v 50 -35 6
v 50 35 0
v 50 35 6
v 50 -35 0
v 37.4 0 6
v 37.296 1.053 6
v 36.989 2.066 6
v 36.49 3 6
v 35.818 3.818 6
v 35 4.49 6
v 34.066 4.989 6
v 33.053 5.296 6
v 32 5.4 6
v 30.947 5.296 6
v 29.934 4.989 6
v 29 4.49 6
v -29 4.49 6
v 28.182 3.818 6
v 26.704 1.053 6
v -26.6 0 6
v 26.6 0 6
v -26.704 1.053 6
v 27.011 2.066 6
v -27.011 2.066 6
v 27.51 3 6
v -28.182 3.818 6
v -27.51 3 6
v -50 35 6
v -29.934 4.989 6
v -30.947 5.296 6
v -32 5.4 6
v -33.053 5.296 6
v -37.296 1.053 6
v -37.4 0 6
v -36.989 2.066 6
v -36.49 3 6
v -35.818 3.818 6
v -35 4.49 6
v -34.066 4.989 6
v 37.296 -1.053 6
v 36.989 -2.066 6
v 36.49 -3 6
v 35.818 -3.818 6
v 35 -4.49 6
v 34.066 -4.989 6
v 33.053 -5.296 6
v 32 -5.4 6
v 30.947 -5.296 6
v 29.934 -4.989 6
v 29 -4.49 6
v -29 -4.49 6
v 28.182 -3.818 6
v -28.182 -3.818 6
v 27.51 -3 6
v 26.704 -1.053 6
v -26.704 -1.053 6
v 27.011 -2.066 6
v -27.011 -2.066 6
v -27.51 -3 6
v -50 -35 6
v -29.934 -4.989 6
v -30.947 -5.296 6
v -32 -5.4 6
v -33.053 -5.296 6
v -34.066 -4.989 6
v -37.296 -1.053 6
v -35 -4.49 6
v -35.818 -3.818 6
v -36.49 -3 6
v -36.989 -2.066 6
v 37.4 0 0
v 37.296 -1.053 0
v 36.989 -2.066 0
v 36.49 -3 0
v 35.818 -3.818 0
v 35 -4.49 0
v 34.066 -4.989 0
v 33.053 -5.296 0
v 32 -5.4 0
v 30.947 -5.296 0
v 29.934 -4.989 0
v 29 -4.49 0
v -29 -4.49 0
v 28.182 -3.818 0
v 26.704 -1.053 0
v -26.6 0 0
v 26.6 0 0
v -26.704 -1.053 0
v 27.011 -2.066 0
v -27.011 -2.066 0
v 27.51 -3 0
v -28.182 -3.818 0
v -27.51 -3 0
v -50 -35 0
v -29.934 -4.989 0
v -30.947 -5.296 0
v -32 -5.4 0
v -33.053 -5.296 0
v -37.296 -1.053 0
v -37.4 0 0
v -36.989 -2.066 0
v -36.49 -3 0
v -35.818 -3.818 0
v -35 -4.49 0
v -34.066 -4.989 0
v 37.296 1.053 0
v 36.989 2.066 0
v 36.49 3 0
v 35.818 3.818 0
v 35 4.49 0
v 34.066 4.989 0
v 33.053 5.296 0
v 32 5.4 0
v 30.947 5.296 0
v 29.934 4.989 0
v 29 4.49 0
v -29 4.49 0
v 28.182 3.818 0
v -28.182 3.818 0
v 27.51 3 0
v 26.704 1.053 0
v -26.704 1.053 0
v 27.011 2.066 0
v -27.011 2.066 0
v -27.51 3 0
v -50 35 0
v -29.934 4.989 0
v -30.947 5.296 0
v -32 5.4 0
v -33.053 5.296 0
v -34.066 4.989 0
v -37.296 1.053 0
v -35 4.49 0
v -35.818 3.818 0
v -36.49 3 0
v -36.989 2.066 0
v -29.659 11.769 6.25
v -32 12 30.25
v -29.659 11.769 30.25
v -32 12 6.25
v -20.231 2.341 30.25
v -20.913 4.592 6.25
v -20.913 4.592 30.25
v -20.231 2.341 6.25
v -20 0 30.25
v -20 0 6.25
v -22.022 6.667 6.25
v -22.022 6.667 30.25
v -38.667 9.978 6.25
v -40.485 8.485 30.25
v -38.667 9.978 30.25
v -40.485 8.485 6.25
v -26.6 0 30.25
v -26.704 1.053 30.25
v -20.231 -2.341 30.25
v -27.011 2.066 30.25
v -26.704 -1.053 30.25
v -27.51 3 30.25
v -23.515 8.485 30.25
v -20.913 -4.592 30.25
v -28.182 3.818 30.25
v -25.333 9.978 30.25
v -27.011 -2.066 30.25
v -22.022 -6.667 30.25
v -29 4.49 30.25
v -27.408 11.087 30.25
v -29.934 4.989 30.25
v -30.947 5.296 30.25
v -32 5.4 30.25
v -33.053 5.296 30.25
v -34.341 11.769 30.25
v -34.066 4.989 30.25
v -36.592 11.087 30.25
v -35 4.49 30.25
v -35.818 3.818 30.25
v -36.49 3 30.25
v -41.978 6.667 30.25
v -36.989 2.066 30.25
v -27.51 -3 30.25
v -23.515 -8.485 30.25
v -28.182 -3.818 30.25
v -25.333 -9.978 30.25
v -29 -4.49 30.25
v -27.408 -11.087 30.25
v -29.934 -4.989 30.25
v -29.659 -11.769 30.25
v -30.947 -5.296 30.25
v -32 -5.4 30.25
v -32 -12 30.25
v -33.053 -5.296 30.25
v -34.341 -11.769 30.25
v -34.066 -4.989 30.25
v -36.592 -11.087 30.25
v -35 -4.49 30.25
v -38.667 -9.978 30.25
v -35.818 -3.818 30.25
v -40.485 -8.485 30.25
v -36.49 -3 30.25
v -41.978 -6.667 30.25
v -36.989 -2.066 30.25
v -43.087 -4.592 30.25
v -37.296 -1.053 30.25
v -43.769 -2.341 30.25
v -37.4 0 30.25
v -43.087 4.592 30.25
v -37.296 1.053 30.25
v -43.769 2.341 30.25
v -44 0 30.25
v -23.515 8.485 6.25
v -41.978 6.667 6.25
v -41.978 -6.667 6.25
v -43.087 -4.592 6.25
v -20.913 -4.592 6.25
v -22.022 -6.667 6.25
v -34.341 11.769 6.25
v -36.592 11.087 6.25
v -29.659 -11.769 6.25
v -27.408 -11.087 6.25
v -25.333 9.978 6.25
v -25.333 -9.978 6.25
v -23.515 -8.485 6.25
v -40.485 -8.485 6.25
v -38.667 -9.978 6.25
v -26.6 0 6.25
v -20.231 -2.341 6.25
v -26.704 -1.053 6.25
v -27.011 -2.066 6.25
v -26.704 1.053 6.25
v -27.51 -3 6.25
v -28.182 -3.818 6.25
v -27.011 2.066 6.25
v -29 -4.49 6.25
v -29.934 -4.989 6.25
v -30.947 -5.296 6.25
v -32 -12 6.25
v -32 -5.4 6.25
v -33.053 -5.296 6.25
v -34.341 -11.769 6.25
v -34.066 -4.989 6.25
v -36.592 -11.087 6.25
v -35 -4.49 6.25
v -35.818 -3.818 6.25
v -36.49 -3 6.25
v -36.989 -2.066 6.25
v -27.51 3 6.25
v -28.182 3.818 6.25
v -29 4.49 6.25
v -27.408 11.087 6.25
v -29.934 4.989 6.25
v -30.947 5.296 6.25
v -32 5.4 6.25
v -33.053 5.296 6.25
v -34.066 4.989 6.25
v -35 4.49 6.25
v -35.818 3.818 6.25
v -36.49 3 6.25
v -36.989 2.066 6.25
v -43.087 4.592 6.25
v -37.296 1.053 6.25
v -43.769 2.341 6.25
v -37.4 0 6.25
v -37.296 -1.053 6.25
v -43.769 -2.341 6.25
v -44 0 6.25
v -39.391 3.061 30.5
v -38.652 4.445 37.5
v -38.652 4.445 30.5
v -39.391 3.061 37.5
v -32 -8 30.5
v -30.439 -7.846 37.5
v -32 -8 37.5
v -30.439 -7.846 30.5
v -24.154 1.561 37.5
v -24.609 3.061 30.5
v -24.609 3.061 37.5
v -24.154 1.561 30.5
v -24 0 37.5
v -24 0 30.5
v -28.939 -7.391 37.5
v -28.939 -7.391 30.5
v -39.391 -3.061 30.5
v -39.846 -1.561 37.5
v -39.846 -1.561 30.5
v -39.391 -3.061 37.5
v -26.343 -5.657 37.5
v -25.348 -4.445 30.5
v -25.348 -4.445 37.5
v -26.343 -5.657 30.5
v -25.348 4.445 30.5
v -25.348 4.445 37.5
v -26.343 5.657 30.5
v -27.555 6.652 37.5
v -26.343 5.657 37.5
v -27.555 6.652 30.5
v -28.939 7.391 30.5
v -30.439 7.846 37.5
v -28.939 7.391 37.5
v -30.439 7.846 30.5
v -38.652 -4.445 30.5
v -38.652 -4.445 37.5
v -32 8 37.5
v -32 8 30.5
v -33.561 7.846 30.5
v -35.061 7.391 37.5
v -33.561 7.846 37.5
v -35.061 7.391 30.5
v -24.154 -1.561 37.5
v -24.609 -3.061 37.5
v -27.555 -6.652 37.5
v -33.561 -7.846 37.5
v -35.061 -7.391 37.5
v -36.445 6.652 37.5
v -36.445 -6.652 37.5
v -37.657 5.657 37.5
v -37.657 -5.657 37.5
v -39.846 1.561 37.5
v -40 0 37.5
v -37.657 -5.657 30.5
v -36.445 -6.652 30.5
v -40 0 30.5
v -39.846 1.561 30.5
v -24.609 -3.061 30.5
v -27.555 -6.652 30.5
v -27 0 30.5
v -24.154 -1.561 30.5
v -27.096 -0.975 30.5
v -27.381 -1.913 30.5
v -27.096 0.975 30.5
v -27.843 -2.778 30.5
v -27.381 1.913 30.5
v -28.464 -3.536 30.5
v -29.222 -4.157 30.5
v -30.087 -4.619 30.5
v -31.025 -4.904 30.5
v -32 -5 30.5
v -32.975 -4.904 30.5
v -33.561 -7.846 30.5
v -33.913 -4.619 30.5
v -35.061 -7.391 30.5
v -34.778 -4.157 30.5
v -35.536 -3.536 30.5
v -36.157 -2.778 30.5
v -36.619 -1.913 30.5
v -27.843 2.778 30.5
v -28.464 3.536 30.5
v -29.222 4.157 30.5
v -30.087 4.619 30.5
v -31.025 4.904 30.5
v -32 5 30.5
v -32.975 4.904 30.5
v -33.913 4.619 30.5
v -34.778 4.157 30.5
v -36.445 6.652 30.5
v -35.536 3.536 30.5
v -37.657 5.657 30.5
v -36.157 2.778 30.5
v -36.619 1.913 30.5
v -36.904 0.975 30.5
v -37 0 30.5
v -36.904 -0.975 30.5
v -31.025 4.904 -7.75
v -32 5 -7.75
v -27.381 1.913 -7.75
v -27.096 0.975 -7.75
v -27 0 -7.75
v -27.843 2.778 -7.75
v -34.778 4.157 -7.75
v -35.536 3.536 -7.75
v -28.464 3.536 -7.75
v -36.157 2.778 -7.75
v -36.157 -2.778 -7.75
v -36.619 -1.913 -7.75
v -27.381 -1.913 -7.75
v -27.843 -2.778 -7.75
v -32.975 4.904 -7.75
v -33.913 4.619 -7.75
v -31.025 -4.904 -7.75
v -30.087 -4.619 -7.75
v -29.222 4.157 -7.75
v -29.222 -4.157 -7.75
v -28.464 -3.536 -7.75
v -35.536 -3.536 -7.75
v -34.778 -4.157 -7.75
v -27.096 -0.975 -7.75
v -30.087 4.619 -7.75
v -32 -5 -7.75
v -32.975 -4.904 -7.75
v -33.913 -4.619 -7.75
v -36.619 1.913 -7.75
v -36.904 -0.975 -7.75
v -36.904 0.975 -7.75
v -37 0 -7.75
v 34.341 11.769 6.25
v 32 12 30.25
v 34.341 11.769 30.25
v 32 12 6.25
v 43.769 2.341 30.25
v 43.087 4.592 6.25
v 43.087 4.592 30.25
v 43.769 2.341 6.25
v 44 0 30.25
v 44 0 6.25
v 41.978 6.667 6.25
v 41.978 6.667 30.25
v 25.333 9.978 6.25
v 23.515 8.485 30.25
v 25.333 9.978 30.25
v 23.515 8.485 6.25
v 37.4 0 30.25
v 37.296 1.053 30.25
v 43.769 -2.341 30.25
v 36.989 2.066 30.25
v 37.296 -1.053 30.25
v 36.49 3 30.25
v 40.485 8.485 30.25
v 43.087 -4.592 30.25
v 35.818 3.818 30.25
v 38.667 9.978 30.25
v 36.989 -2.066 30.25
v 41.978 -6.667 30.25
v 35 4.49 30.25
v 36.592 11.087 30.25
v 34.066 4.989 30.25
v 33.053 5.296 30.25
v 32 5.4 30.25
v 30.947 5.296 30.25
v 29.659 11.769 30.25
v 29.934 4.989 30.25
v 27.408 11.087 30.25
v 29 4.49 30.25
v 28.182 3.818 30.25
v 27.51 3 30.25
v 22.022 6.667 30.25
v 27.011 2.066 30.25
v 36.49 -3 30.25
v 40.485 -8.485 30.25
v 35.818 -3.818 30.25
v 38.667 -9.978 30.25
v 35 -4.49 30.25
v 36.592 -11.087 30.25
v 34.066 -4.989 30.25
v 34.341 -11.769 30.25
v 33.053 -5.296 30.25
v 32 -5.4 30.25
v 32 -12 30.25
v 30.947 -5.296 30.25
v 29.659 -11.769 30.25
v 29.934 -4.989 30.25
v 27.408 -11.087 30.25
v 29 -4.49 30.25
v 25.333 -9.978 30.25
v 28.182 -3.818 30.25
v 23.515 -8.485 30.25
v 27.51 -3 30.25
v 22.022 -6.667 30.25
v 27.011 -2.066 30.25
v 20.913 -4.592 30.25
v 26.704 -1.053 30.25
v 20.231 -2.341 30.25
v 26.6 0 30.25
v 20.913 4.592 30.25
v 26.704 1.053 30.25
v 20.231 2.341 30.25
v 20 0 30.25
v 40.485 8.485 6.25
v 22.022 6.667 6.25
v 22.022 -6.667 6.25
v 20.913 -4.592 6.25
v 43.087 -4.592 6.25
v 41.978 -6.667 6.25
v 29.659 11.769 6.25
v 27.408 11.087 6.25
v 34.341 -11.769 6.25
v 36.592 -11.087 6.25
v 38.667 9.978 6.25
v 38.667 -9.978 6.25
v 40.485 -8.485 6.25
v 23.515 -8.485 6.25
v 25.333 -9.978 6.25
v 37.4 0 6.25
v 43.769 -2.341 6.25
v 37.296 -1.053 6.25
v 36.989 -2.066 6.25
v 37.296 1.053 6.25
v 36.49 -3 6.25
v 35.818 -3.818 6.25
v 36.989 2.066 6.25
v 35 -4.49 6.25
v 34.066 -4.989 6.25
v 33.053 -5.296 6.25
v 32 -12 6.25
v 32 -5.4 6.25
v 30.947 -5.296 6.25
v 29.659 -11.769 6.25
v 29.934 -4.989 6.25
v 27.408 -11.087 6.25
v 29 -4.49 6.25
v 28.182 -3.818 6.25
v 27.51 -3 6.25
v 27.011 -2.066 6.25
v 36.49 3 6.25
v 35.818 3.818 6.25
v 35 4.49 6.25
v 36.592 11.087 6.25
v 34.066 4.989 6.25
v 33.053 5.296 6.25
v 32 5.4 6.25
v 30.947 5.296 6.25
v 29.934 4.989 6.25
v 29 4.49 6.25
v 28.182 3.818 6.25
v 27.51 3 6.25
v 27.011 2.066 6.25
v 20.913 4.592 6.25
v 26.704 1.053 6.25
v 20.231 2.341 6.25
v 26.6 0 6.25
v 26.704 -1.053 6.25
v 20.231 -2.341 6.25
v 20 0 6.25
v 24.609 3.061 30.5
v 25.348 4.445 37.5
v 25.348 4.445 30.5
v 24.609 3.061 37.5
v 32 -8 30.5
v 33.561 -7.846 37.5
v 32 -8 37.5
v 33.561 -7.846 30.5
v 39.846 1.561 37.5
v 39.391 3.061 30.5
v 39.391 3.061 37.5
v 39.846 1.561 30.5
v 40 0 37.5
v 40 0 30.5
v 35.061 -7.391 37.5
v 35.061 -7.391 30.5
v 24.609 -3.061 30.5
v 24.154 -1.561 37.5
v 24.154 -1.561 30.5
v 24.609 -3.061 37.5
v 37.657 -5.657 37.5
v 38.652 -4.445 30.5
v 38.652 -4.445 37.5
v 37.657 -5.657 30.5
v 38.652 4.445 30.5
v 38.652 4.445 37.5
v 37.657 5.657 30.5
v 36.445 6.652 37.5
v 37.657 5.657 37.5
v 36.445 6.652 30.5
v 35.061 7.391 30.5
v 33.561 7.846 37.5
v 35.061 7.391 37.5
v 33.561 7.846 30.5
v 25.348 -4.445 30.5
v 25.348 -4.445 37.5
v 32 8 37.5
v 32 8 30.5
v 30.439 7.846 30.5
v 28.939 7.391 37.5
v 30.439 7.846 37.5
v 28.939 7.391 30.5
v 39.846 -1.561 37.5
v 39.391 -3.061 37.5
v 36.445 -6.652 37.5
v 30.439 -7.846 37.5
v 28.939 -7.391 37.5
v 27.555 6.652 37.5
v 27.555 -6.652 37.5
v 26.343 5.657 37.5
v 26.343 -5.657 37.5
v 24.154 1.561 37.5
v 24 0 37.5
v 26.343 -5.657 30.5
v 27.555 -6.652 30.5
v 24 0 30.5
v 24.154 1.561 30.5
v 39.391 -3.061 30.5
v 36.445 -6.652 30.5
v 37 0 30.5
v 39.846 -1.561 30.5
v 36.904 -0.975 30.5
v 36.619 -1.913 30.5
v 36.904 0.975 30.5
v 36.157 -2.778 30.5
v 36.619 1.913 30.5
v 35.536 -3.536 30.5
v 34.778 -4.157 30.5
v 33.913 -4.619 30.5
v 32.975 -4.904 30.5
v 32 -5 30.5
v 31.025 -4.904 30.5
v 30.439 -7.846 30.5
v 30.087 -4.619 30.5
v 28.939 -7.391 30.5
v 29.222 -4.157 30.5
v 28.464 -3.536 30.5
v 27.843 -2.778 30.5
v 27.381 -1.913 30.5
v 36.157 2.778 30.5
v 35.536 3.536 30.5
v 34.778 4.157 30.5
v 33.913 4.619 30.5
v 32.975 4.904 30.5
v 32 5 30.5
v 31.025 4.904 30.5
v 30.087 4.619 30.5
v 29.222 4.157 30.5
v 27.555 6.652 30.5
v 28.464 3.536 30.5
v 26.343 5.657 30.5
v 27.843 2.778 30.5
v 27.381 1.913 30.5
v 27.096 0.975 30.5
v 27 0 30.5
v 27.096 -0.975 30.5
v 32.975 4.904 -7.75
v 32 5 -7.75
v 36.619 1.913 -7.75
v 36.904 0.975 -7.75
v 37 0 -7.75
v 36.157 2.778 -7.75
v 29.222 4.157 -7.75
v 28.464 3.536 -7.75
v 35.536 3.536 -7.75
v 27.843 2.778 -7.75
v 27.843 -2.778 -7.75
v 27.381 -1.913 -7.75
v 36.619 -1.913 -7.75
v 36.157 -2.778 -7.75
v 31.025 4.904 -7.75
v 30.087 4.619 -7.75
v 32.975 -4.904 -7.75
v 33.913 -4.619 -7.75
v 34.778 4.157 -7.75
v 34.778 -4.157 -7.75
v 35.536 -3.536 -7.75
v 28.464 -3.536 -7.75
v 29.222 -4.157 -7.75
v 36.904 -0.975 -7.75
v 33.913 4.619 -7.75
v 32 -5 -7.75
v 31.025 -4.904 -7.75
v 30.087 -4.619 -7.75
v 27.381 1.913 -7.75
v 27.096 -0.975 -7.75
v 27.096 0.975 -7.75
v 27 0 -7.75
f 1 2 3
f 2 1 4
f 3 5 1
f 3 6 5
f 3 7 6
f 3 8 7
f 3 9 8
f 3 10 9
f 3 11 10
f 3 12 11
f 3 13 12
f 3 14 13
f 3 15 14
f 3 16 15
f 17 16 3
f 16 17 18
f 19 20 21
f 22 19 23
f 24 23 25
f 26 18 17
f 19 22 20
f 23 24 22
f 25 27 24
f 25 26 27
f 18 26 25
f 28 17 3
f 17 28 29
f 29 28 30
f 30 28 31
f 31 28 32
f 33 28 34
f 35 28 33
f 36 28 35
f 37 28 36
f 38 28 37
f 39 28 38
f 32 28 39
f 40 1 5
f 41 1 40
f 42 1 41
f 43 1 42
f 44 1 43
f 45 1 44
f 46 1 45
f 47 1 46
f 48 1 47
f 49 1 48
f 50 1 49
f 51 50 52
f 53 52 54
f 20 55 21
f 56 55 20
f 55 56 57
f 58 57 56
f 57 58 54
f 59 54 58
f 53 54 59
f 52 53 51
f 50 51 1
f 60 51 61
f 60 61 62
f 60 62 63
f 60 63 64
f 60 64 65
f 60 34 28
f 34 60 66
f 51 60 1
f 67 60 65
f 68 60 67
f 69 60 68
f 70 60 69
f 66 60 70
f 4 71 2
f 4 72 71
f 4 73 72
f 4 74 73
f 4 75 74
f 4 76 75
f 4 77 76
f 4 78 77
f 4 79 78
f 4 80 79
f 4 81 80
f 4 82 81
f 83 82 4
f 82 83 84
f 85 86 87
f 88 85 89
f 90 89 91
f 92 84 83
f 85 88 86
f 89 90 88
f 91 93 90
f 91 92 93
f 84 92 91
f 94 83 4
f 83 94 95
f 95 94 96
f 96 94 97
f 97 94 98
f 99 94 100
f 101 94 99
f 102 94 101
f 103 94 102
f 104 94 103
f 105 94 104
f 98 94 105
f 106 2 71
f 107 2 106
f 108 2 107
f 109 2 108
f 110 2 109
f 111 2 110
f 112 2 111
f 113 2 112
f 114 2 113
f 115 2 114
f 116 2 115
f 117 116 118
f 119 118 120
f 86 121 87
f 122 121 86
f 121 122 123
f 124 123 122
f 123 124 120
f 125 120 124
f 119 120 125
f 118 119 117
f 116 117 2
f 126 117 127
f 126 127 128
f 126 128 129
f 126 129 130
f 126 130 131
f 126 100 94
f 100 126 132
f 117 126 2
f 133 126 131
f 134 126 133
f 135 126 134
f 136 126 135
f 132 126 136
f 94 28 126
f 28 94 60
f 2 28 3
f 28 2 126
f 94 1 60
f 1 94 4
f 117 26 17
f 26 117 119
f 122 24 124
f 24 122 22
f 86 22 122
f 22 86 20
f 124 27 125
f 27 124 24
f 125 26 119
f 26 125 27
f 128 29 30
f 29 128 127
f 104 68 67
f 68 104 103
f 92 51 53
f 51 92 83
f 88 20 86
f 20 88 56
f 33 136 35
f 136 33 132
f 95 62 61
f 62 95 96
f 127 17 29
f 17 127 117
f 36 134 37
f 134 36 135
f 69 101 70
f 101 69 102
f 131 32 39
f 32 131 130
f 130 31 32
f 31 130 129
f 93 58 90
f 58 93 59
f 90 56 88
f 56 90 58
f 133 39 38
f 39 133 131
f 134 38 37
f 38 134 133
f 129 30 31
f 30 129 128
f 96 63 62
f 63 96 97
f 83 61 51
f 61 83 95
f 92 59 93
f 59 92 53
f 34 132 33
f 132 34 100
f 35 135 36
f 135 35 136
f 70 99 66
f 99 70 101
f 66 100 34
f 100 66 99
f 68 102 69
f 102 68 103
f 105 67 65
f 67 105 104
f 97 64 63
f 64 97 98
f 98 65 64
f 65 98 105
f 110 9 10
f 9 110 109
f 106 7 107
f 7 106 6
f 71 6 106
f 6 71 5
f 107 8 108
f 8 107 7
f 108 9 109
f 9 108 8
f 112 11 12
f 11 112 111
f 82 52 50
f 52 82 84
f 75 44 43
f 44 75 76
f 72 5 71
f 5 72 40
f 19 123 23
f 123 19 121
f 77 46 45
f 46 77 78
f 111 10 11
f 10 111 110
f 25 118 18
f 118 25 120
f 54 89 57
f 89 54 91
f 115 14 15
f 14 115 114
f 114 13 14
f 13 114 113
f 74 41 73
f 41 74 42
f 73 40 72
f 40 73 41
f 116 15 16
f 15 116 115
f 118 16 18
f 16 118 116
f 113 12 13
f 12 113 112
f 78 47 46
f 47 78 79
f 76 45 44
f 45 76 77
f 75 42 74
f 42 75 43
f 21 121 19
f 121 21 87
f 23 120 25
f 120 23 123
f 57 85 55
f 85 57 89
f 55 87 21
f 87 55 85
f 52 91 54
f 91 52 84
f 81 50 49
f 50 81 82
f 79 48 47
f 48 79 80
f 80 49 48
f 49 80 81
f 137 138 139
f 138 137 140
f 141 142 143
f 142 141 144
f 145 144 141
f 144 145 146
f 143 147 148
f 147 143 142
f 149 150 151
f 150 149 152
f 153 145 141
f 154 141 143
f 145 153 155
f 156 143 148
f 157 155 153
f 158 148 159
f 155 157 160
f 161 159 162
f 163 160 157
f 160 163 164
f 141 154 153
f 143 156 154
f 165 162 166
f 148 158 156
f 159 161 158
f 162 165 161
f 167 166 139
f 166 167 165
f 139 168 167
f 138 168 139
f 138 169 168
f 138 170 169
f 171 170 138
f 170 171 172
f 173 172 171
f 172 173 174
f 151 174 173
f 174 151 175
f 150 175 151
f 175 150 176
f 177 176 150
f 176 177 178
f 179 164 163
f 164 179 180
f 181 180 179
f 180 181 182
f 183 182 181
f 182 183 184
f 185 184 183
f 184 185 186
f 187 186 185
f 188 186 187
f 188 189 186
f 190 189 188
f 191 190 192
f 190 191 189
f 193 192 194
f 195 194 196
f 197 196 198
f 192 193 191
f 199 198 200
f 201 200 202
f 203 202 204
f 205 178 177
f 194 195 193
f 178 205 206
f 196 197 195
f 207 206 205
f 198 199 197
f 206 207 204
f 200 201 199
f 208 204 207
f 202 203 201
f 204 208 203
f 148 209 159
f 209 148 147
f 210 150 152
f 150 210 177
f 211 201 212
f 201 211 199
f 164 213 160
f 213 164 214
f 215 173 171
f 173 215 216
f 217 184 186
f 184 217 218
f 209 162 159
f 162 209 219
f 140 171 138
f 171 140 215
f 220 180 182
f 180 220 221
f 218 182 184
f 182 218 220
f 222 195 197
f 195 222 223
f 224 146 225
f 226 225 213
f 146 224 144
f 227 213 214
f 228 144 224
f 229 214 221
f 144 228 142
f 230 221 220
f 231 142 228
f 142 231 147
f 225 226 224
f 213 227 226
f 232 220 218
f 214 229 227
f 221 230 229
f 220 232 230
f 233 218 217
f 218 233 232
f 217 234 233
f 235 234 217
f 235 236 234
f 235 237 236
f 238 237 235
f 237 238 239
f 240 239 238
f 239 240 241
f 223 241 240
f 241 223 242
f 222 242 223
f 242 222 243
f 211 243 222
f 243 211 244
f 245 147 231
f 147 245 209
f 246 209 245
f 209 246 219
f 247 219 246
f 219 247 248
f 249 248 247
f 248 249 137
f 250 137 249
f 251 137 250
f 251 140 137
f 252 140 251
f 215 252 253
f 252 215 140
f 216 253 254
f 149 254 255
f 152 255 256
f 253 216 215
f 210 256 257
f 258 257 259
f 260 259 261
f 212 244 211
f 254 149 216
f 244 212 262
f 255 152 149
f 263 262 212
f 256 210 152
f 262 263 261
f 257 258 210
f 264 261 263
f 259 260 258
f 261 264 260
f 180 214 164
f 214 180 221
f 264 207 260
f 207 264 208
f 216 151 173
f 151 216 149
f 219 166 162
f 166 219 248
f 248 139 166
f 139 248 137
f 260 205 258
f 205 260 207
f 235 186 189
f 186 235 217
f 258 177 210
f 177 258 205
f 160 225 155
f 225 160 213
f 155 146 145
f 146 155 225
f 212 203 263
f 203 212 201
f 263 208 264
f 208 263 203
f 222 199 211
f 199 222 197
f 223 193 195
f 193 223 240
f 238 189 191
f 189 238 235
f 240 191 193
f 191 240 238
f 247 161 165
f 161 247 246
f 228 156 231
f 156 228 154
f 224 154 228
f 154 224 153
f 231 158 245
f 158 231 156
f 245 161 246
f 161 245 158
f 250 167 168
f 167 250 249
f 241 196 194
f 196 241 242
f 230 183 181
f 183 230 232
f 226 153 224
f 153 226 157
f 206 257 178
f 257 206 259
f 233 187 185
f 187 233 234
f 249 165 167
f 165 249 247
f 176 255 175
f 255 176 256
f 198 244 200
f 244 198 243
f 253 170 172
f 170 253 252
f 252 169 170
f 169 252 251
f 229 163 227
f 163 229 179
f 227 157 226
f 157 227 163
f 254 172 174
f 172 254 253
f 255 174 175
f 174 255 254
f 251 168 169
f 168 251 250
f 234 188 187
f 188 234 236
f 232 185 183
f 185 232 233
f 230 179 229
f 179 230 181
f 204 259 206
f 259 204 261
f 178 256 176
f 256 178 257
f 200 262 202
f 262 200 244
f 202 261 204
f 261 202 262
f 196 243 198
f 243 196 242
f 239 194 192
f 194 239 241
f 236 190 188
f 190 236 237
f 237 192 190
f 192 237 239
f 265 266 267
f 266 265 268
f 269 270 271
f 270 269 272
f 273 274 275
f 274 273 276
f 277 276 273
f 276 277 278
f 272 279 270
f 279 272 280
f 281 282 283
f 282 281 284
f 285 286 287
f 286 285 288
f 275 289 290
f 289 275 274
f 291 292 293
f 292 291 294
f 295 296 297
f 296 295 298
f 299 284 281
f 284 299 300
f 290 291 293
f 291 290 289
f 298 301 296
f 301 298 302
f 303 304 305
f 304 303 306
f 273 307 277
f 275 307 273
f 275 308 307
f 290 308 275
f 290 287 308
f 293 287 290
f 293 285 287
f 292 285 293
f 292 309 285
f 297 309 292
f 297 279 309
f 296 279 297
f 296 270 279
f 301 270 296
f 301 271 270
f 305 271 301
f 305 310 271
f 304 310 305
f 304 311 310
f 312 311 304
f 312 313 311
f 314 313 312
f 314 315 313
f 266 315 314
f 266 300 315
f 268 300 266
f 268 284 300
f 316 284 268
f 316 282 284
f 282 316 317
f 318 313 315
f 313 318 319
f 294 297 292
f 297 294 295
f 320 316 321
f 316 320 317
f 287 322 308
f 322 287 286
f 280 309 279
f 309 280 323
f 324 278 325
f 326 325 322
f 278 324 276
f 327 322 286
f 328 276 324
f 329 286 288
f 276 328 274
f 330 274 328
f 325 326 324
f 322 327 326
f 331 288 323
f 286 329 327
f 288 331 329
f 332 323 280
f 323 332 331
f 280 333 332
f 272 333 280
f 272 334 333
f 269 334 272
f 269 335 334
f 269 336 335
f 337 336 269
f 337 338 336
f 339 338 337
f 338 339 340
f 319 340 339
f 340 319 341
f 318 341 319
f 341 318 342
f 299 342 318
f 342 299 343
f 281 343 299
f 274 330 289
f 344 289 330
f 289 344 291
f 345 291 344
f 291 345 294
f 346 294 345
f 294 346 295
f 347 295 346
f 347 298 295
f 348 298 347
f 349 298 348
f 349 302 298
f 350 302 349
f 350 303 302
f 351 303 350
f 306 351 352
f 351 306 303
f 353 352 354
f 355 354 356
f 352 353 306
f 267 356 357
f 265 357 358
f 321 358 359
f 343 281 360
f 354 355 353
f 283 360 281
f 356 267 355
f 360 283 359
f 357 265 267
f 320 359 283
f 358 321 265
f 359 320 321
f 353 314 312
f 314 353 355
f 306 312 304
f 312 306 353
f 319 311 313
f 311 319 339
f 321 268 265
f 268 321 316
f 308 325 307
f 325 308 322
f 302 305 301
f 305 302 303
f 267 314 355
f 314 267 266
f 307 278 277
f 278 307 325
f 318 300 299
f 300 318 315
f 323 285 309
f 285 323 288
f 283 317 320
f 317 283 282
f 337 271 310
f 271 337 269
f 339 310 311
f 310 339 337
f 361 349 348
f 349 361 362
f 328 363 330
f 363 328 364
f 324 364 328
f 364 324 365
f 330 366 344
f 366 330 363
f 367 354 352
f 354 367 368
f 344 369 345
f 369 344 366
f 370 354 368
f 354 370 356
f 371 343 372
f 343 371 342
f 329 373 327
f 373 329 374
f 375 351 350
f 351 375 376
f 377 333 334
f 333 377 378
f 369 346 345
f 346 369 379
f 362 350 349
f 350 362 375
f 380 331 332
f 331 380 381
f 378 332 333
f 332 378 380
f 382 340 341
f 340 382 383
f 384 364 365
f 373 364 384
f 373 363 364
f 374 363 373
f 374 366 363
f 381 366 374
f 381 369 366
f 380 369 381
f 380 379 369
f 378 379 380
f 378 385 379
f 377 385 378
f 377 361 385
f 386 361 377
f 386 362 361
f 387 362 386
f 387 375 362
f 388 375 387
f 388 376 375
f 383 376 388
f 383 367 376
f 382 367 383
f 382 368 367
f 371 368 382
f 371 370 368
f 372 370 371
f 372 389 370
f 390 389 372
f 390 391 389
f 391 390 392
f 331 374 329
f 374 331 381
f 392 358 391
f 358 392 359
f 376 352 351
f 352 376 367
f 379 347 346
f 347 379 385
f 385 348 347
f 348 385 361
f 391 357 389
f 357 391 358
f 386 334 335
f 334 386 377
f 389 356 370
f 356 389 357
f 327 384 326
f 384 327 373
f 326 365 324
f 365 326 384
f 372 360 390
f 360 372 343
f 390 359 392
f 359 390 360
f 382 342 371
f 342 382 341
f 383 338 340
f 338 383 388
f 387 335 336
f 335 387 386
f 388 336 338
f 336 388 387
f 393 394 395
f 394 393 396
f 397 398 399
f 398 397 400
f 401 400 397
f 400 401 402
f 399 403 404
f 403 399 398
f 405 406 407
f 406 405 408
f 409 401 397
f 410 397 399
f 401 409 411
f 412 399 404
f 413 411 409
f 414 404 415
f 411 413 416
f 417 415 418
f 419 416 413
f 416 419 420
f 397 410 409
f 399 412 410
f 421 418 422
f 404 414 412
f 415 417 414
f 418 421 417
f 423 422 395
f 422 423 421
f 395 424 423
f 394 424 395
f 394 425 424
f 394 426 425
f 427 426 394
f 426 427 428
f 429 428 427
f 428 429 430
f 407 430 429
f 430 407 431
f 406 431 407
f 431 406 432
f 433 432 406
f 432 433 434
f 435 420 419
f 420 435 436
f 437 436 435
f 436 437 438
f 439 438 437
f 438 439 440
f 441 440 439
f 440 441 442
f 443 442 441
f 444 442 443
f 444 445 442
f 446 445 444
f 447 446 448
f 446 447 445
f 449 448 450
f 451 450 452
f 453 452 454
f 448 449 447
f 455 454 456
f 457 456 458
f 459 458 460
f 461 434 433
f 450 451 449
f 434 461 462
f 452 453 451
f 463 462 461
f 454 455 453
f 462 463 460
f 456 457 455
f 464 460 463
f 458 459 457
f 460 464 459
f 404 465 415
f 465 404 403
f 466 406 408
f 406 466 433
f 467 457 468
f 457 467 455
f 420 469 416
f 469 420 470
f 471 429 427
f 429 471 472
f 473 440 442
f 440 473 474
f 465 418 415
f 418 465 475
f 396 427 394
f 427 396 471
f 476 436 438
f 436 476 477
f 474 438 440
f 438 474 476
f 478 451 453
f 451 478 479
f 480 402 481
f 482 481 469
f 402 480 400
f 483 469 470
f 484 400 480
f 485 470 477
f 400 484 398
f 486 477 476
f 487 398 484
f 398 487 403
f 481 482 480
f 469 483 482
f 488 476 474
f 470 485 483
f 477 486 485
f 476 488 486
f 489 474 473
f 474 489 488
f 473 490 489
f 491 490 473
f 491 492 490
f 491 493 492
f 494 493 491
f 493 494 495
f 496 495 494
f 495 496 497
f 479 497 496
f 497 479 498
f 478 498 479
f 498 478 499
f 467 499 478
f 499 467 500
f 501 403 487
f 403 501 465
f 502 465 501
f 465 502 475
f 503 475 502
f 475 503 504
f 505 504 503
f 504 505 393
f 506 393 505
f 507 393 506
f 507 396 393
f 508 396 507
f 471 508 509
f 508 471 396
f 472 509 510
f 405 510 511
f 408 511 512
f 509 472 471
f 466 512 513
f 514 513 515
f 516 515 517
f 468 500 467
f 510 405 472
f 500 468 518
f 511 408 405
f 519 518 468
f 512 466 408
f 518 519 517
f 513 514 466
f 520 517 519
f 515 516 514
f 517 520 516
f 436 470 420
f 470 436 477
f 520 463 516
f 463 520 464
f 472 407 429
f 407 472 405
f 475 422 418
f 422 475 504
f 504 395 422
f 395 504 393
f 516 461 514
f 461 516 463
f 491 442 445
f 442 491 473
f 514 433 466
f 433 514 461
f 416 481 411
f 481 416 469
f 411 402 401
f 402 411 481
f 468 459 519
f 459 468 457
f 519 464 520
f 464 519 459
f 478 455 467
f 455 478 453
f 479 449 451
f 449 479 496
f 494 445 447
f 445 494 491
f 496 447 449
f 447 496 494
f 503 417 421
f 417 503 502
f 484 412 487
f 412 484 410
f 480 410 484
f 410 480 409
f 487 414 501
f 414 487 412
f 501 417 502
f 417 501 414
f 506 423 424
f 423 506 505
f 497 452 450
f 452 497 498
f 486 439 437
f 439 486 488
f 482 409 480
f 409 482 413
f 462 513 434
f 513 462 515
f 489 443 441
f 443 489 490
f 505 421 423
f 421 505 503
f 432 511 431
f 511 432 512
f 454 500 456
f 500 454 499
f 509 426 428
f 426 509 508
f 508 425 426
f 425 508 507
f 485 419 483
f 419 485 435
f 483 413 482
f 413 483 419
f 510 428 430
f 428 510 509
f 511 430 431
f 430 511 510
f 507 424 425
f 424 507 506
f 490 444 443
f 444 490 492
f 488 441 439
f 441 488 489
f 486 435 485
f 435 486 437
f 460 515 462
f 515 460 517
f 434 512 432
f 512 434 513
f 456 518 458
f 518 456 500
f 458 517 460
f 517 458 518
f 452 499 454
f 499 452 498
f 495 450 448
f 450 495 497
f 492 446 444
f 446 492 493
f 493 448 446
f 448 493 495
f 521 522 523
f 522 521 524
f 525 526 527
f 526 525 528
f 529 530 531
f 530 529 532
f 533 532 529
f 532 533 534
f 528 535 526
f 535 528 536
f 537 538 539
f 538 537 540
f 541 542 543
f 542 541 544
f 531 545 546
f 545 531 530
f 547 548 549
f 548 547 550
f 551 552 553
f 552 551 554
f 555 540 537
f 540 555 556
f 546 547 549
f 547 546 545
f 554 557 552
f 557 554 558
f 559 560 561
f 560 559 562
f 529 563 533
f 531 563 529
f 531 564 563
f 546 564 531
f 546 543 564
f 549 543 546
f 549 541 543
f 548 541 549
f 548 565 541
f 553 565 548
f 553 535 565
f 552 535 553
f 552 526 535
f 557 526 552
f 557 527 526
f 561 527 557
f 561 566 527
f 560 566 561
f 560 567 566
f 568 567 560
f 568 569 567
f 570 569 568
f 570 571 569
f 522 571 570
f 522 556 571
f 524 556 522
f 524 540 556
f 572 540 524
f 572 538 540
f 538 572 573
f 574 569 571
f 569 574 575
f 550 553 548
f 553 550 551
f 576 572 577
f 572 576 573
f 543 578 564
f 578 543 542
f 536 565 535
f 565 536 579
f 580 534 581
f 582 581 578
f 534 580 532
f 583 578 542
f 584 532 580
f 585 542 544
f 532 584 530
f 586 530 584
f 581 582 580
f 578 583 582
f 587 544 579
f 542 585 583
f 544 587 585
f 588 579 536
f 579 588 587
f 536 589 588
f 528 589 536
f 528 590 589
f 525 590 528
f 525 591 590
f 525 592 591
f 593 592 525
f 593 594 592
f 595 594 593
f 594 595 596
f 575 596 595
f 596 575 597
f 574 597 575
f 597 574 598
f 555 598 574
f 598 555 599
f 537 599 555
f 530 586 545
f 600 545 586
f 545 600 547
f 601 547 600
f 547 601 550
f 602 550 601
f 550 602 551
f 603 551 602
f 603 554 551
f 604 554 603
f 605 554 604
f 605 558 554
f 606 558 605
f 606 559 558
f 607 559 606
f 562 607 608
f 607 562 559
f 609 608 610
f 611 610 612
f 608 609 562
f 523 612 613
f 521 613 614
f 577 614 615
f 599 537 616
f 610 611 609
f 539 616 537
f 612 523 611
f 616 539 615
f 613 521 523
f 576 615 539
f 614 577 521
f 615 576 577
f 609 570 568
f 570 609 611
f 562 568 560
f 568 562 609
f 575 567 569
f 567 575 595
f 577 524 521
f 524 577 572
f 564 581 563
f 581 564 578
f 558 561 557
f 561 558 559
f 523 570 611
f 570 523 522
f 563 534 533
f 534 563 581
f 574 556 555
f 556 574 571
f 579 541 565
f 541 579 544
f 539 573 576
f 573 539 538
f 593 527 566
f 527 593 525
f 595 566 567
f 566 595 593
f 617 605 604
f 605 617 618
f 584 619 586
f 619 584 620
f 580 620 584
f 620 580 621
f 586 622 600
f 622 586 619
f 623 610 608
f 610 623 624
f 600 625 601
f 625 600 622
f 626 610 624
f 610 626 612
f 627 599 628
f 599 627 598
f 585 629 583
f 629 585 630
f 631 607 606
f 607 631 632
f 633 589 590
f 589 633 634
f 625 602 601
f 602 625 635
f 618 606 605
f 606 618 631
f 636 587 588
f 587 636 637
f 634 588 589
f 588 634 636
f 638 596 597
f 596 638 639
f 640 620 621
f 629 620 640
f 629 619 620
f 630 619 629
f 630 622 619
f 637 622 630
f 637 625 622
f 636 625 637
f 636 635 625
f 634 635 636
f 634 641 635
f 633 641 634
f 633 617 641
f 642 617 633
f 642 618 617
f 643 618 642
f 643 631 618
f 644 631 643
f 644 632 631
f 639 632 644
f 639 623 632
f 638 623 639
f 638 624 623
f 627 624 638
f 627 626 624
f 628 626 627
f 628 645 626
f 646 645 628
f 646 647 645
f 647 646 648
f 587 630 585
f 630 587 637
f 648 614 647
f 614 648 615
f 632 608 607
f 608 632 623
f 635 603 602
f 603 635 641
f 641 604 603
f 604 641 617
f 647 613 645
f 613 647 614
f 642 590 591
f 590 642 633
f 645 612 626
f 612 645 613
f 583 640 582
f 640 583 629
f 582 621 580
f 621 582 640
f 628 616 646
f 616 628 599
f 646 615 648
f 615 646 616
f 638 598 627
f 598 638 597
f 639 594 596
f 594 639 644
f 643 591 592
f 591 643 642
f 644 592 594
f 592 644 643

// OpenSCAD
$fn = 32;

// ------------------------------------------------------------------------
// Standoff columns: 2 d24 standoffs, bolts d10
// Every part is its own module, assembly() places them once.
// ------------------------------------------------------------------------

// --- part 1 ---
module base_plate() {
  difference() {
    translate([-50, -35, 0]) cube([100, 70, 6]);
    translate([-32, 0, -1]) cylinder(h = 8, d = 10.8);
    translate([32, 0, -1]) cylinder(h = 8, d = 10.8);
  }
}

// --- part 2 ---
module spacer1() {
  difference() {
      translate([0, 0, 0]) cylinder(h = 24, d = 24);
      translate([0, 0, -1]) cylinder(h = 26, d = 10.8);
    }
}

// --- part 3 ---
module bolt1() {
  cylinder(h = 7, d = 16);
  translate([0, 0, -38.25]) cylinder(h = 38.25, d = 10);
}

// --- part 4 ---
module spacer2() {
  difference() {
      translate([0, 0, 0]) cylinder(h = 24, d = 24);
      translate([0, 0, -1]) cylinder(h = 26, d = 10.8);
    }
}

// --- part 5 ---
module bolt2() {
  cylinder(h = 7, d = 16);
  translate([0, 0, -38.25]) cylinder(h = 38.25, d = 10);
}

// --- assembly ---
module assembly() {
  translate([0, 0, 0]) rotate([0, 0, 0]) base_plate();
  translate([-32, 0, 6.25]) rotate([0, 0, 0]) spacer1();
  translate([-32, 0, 30.5]) rotate([0, 0, 0]) bolt1();
  translate([32, 0, 6.25]) rotate([0, 0, 0]) spacer2();
  translate([32, 0, 30.5]) rotate([0, 0, 0]) bolt2();
}

assembly();
